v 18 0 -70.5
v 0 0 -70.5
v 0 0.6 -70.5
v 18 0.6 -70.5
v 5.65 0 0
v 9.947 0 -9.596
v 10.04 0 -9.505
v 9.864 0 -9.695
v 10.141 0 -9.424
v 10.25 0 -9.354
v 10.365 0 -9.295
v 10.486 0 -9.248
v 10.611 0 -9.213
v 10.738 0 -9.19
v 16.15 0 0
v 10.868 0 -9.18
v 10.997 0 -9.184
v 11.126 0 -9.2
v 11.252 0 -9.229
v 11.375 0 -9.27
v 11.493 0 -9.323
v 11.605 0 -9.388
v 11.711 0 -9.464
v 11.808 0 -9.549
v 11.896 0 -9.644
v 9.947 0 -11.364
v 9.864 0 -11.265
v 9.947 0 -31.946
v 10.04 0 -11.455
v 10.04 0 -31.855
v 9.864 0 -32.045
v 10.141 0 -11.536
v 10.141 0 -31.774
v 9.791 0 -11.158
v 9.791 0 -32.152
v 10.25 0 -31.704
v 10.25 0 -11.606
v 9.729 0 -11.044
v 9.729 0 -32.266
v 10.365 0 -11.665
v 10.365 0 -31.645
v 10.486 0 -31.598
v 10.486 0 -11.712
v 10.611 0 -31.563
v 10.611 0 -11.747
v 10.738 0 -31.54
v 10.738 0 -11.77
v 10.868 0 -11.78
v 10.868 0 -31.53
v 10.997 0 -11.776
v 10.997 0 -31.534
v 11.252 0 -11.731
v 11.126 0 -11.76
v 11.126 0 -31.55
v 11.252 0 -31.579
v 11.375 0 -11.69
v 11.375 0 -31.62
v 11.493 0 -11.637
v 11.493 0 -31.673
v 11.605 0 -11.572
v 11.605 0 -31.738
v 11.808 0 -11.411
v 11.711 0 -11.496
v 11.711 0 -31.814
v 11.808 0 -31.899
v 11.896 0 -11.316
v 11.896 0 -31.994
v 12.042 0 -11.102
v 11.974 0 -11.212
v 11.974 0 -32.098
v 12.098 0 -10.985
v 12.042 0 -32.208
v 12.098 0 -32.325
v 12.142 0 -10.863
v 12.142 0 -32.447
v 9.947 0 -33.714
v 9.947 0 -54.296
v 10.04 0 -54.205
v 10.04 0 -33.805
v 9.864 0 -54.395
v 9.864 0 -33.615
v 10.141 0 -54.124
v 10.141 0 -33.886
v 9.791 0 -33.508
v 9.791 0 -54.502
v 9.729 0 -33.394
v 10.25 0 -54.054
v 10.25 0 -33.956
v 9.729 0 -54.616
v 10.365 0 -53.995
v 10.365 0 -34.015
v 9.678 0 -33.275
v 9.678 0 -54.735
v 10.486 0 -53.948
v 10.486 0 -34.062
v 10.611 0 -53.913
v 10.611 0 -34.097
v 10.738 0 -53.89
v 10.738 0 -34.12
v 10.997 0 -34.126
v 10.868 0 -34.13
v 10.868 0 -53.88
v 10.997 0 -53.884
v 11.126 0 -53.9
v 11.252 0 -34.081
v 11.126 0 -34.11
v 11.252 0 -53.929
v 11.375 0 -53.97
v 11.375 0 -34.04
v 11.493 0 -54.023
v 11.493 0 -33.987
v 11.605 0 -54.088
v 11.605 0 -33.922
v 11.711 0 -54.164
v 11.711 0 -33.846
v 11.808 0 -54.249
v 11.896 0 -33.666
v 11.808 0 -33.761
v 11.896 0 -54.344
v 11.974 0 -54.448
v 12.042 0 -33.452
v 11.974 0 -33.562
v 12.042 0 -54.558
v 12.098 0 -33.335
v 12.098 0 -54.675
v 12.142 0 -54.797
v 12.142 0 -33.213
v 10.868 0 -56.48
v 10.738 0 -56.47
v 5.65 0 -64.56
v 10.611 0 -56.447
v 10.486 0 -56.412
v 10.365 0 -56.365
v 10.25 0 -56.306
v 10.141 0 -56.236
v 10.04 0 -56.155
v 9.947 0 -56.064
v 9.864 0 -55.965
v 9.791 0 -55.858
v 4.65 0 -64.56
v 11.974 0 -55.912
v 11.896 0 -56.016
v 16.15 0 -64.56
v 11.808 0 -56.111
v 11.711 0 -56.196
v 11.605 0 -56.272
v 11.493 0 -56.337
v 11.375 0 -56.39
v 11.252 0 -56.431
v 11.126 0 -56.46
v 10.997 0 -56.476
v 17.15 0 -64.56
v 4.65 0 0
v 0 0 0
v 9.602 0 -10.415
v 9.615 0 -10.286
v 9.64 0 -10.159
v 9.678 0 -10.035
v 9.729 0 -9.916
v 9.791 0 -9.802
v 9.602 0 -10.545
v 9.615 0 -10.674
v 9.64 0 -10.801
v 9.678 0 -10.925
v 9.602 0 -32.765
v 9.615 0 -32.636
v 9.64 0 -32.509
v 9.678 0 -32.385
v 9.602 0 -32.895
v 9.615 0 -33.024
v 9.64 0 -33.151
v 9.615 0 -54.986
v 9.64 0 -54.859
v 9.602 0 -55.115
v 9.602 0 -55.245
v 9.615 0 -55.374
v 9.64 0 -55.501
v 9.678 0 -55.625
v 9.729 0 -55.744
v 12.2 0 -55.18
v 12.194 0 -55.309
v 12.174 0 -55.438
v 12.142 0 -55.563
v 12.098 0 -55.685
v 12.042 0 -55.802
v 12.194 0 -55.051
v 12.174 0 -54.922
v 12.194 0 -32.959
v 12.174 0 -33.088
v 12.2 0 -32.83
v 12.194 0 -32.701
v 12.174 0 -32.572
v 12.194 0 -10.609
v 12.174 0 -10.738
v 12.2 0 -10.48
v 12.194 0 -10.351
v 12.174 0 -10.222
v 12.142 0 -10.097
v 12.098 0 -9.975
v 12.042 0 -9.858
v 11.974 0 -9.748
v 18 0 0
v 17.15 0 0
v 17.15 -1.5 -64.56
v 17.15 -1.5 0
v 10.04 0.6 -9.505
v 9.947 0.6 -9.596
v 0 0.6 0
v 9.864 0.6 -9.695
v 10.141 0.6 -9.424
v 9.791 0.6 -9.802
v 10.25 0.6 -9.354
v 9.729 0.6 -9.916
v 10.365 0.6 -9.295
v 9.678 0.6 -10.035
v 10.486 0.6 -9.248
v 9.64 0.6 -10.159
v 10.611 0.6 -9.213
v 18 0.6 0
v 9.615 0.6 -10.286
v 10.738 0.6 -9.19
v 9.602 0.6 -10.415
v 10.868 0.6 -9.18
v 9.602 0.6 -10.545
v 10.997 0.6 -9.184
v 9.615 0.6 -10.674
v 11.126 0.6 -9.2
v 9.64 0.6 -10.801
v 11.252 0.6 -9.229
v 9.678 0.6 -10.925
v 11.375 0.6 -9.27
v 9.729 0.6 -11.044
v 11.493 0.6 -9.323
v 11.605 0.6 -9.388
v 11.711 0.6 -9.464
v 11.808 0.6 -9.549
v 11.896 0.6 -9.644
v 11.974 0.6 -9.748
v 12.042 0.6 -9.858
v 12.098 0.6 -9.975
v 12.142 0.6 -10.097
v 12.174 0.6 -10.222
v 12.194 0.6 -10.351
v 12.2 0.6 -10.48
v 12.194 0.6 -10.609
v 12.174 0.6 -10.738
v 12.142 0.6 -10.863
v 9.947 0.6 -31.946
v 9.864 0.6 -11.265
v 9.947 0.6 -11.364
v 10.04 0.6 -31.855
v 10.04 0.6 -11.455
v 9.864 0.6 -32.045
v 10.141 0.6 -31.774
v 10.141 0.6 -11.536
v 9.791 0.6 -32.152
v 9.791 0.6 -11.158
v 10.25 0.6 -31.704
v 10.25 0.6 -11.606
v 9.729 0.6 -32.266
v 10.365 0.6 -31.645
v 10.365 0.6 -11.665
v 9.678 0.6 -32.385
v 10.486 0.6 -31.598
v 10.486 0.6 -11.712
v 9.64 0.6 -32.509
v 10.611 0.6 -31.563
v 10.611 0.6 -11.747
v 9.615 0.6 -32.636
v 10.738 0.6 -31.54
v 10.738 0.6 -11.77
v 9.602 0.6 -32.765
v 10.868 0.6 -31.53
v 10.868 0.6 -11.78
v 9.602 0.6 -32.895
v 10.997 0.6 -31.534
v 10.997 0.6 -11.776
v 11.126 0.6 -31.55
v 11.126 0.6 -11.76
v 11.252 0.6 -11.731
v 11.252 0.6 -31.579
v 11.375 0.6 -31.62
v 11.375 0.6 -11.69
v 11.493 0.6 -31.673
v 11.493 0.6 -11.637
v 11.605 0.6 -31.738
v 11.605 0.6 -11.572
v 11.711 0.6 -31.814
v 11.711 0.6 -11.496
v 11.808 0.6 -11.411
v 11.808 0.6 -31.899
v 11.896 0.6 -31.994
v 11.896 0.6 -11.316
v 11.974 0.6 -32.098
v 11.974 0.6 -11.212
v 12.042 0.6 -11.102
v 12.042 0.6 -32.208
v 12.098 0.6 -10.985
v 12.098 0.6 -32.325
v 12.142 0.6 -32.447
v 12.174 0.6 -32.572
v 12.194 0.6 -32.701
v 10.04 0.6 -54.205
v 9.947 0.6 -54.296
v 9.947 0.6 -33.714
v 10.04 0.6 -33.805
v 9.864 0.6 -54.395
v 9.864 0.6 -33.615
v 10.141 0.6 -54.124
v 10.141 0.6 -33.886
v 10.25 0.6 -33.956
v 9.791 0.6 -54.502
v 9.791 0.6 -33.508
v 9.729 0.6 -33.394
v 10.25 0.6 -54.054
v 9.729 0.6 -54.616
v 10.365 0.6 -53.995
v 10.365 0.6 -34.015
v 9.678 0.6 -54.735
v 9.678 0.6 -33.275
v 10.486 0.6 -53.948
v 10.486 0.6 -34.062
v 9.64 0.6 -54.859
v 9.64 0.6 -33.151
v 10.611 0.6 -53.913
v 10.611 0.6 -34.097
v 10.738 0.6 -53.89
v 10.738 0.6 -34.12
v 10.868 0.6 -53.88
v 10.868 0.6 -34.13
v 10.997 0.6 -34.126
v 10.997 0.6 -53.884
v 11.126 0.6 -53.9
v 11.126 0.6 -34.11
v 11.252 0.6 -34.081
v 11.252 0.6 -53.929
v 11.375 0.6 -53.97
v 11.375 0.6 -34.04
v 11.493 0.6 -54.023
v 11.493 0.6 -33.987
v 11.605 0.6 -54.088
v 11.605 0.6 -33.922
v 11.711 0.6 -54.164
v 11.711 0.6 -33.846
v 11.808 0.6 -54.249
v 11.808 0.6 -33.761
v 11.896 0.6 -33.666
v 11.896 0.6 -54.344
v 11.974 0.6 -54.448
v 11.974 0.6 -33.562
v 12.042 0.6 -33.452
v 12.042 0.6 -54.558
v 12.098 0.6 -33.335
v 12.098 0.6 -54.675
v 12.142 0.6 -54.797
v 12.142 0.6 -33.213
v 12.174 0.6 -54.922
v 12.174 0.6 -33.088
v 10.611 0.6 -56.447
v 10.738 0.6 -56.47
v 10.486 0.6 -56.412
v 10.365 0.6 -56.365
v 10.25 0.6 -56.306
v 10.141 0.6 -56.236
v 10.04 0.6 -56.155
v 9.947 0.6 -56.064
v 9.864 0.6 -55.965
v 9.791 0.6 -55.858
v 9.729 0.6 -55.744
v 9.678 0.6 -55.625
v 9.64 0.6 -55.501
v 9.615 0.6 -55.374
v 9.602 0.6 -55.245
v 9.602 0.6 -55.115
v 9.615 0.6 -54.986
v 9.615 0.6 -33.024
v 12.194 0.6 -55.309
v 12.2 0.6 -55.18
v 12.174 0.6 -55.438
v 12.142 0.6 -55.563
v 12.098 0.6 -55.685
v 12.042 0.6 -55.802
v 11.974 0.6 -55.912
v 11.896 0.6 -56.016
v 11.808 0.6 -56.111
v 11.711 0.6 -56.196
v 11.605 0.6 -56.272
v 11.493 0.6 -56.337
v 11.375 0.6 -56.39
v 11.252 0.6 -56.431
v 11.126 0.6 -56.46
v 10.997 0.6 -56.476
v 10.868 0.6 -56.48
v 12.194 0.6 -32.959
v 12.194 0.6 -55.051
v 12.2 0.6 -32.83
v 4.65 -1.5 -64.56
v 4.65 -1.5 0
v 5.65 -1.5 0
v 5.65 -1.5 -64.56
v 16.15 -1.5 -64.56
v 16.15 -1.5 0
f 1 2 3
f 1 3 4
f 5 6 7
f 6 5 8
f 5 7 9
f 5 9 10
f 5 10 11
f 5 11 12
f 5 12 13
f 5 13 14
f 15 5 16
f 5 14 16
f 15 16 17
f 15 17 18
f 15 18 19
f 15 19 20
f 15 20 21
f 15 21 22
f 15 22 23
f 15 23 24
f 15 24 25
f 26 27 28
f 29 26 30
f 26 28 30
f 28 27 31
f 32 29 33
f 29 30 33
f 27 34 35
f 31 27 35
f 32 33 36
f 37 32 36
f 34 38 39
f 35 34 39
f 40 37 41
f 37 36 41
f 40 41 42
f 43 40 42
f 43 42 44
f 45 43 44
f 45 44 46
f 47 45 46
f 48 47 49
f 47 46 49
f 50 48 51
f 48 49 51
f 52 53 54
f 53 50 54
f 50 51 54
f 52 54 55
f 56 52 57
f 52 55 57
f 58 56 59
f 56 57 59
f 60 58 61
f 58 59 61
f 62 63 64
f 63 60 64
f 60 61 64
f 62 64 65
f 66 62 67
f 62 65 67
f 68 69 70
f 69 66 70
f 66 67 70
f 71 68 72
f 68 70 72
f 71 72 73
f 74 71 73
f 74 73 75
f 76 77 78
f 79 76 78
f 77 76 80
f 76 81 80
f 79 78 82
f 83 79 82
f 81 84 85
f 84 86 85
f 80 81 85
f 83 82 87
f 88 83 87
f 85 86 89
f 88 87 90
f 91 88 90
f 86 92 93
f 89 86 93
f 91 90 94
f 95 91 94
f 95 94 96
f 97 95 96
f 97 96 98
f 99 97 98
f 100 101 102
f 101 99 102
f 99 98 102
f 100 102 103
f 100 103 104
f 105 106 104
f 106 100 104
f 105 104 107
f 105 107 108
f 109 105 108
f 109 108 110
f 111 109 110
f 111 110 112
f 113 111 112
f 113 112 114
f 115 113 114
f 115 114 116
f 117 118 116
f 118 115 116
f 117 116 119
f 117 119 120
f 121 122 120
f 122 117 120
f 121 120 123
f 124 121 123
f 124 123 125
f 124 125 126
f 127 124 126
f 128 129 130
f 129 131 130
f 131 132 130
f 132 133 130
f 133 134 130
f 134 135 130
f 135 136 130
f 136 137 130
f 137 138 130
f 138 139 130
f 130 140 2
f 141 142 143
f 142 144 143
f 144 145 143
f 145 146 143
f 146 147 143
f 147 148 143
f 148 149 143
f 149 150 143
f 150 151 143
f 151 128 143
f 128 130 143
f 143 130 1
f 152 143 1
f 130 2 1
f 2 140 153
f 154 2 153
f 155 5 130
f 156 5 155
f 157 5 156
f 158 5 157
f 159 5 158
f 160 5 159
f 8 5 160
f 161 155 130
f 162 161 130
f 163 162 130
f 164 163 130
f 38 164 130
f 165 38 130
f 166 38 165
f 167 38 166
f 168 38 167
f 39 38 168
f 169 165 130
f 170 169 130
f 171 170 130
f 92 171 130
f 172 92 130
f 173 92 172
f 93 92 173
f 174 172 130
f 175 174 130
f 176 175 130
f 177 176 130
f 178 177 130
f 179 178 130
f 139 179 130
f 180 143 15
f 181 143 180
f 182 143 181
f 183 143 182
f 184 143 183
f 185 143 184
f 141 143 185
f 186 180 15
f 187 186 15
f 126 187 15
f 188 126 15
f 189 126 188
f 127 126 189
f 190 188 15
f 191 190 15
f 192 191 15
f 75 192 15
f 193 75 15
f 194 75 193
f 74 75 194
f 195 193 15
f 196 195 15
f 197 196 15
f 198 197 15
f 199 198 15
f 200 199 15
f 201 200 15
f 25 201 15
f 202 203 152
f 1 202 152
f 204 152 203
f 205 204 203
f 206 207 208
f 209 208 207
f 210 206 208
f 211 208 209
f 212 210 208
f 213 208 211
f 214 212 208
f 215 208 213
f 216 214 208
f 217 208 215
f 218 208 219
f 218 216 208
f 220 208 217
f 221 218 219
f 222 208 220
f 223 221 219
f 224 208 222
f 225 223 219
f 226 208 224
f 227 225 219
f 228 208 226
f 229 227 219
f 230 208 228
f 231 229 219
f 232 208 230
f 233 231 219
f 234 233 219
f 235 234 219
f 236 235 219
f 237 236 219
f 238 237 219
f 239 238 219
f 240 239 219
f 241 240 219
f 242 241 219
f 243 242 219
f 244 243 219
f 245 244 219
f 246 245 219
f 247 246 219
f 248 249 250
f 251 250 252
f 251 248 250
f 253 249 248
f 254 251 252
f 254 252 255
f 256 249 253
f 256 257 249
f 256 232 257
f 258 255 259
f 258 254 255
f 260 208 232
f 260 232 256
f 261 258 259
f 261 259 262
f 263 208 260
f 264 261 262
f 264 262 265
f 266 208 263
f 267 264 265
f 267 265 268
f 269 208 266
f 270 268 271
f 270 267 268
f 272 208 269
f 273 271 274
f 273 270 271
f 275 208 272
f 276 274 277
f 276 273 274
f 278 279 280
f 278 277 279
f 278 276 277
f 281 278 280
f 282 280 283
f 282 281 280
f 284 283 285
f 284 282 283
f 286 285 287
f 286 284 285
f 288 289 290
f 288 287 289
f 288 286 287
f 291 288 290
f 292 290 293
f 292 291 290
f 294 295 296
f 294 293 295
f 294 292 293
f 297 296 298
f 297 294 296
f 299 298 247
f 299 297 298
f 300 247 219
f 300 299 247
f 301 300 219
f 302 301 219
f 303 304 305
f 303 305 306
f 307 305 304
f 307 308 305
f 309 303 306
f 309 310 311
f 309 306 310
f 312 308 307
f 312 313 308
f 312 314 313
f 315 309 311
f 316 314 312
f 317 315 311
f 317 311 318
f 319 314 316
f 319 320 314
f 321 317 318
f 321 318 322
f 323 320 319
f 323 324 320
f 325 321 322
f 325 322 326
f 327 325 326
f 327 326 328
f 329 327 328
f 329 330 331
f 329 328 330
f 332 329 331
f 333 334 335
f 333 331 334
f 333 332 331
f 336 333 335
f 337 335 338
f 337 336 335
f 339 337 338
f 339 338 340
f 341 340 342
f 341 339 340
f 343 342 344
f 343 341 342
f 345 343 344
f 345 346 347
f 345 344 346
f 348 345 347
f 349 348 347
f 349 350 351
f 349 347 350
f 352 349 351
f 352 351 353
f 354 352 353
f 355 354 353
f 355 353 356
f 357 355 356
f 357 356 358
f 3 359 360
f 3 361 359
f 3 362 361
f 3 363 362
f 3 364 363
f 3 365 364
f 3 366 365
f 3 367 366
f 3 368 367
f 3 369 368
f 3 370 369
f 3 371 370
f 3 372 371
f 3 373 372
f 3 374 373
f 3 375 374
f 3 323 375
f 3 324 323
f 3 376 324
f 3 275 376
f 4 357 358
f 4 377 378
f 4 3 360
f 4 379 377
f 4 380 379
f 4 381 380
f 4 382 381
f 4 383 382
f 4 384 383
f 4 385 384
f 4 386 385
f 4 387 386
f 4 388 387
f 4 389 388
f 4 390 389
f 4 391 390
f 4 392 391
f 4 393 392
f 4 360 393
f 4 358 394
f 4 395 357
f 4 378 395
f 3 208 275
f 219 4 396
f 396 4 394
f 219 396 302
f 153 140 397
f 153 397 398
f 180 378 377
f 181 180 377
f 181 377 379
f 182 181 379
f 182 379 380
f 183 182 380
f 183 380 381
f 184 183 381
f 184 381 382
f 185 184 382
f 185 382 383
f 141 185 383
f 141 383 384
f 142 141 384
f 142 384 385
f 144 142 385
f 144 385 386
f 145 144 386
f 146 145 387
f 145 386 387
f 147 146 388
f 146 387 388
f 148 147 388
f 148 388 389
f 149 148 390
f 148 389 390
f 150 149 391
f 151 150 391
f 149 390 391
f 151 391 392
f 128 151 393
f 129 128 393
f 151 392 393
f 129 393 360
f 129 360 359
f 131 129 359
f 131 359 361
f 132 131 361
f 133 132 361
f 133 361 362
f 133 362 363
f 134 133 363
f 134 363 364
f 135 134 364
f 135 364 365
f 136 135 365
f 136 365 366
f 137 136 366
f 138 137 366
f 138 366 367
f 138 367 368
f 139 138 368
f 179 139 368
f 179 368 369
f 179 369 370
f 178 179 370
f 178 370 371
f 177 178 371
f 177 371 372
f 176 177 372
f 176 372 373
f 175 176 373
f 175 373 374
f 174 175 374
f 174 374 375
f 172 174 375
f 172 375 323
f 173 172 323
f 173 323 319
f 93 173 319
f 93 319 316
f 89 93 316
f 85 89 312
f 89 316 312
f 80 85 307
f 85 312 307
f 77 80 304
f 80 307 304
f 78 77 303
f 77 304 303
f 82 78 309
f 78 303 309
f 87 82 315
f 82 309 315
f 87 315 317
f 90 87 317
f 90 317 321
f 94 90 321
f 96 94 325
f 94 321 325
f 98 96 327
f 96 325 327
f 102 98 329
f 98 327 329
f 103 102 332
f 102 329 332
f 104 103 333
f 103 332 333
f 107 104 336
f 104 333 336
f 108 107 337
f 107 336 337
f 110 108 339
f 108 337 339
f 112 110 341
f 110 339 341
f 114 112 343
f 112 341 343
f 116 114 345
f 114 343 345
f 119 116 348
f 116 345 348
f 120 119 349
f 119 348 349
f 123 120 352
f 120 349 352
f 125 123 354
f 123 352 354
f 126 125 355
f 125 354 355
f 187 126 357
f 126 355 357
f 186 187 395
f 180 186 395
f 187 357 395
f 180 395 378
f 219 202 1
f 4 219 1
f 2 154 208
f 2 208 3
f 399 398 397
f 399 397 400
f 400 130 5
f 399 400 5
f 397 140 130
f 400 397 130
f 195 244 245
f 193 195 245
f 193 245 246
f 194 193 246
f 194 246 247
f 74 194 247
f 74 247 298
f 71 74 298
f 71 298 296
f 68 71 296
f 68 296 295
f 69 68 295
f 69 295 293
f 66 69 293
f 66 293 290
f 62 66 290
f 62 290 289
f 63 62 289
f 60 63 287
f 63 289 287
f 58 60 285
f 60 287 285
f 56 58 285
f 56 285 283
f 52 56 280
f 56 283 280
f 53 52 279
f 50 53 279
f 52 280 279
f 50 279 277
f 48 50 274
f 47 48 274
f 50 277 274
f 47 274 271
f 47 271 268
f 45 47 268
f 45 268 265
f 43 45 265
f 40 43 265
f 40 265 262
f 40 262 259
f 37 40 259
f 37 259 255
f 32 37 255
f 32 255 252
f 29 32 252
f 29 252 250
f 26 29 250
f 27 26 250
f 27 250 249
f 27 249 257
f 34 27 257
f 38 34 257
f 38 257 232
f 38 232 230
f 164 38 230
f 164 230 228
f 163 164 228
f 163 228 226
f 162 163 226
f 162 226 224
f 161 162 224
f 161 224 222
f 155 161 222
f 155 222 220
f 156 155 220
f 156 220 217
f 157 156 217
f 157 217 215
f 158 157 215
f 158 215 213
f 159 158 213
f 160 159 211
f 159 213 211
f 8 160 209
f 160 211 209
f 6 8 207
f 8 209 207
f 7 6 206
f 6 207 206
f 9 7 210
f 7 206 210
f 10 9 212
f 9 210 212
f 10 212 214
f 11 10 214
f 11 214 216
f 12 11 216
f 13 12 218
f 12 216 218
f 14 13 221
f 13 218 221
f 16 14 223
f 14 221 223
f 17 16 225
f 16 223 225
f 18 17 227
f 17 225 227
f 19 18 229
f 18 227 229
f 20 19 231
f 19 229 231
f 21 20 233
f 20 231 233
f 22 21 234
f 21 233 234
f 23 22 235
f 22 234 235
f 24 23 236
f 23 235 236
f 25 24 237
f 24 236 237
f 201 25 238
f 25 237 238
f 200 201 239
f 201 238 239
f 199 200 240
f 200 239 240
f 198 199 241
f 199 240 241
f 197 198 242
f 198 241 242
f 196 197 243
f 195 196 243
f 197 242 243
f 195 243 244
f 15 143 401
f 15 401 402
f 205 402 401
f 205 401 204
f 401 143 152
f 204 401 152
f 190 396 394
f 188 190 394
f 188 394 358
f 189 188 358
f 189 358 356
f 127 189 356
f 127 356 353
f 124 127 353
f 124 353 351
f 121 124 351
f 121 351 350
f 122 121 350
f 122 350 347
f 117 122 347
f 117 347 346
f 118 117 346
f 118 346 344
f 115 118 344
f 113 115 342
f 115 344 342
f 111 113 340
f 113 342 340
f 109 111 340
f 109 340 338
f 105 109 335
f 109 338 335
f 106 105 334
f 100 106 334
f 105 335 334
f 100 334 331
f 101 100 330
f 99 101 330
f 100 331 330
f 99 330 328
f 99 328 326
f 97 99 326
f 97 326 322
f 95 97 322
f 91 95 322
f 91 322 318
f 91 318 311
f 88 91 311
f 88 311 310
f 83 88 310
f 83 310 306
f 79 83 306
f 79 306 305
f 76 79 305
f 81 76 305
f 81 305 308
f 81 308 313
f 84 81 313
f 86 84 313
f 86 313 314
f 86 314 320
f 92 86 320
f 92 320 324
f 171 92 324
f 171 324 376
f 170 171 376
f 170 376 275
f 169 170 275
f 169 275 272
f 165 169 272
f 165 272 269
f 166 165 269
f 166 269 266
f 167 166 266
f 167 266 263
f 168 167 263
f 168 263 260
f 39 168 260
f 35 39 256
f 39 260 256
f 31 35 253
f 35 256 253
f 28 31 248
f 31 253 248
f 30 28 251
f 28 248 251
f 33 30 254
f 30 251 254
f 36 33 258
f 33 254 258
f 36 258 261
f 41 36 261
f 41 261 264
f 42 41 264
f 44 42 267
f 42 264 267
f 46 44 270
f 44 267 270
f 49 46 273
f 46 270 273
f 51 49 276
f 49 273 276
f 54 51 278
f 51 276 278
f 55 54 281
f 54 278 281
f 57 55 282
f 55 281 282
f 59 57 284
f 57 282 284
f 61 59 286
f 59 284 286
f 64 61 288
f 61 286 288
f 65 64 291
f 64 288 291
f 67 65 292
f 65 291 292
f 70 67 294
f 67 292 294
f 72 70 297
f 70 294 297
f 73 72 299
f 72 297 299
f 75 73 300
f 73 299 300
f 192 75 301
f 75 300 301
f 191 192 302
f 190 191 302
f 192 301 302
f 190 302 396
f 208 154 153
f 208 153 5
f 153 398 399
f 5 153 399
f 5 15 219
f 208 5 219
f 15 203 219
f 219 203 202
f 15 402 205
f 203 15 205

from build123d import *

# Parameters (mm, degrees)
SKETCH1_W           = 18
SKETCH1_H           = 70.5
BOSS_EXTRUDE1_DEPTH = 0.6
SKETCH3_R           = 1.3
CUT_EXTRUDE1_DEPTH  = 10
SKETCH4_W           = 1
SKETCH4_H           = 64.56
BOSS_EXTRUDE2_DEPTH = 1.5


with BuildPart() as part:
    # Sketch1 → Boss-Extrude1 (new body)
    with BuildSketch(Plane(origin=(0, 0, 0), x_dir=(1, 0, 0), z_dir=(0, 1, 0))):
        with Locations((9, 35.25)):
            Rectangle(SKETCH1_W, SKETCH1_H)
    extrude(amount=BOSS_EXTRUDE1_DEPTH)

    # Sketch3 → Cut-Extrude1 (cut)
    with BuildSketch(Plane(origin=(0, 0.6, 0), x_dir=(1, 0, 0), z_dir=(0, 1, 0))):
        with Locations((10.9, 10.48)):
            Circle(SKETCH3_R)
        with Locations((10.9, 32.83)):
            Circle(SKETCH3_R)
        with Locations((10.9, 55.18)):
            Circle(SKETCH3_R)
    extrude(amount=-CUT_EXTRUDE1_DEPTH, mode=Mode.SUBTRACT)

    # Sketch4 → Boss-Extrude2 (add)
    with BuildSketch(Plane.XZ):
        with Locations((5.15, -32.28)):
            Rectangle(SKETCH4_W, SKETCH4_H)
        with Locations((16.65, -32.28)):
            Rectangle(SKETCH4_W, SKETCH4_H)
    extrude(amount=BOSS_EXTRUDE2_DEPTH)


solid = part.part
